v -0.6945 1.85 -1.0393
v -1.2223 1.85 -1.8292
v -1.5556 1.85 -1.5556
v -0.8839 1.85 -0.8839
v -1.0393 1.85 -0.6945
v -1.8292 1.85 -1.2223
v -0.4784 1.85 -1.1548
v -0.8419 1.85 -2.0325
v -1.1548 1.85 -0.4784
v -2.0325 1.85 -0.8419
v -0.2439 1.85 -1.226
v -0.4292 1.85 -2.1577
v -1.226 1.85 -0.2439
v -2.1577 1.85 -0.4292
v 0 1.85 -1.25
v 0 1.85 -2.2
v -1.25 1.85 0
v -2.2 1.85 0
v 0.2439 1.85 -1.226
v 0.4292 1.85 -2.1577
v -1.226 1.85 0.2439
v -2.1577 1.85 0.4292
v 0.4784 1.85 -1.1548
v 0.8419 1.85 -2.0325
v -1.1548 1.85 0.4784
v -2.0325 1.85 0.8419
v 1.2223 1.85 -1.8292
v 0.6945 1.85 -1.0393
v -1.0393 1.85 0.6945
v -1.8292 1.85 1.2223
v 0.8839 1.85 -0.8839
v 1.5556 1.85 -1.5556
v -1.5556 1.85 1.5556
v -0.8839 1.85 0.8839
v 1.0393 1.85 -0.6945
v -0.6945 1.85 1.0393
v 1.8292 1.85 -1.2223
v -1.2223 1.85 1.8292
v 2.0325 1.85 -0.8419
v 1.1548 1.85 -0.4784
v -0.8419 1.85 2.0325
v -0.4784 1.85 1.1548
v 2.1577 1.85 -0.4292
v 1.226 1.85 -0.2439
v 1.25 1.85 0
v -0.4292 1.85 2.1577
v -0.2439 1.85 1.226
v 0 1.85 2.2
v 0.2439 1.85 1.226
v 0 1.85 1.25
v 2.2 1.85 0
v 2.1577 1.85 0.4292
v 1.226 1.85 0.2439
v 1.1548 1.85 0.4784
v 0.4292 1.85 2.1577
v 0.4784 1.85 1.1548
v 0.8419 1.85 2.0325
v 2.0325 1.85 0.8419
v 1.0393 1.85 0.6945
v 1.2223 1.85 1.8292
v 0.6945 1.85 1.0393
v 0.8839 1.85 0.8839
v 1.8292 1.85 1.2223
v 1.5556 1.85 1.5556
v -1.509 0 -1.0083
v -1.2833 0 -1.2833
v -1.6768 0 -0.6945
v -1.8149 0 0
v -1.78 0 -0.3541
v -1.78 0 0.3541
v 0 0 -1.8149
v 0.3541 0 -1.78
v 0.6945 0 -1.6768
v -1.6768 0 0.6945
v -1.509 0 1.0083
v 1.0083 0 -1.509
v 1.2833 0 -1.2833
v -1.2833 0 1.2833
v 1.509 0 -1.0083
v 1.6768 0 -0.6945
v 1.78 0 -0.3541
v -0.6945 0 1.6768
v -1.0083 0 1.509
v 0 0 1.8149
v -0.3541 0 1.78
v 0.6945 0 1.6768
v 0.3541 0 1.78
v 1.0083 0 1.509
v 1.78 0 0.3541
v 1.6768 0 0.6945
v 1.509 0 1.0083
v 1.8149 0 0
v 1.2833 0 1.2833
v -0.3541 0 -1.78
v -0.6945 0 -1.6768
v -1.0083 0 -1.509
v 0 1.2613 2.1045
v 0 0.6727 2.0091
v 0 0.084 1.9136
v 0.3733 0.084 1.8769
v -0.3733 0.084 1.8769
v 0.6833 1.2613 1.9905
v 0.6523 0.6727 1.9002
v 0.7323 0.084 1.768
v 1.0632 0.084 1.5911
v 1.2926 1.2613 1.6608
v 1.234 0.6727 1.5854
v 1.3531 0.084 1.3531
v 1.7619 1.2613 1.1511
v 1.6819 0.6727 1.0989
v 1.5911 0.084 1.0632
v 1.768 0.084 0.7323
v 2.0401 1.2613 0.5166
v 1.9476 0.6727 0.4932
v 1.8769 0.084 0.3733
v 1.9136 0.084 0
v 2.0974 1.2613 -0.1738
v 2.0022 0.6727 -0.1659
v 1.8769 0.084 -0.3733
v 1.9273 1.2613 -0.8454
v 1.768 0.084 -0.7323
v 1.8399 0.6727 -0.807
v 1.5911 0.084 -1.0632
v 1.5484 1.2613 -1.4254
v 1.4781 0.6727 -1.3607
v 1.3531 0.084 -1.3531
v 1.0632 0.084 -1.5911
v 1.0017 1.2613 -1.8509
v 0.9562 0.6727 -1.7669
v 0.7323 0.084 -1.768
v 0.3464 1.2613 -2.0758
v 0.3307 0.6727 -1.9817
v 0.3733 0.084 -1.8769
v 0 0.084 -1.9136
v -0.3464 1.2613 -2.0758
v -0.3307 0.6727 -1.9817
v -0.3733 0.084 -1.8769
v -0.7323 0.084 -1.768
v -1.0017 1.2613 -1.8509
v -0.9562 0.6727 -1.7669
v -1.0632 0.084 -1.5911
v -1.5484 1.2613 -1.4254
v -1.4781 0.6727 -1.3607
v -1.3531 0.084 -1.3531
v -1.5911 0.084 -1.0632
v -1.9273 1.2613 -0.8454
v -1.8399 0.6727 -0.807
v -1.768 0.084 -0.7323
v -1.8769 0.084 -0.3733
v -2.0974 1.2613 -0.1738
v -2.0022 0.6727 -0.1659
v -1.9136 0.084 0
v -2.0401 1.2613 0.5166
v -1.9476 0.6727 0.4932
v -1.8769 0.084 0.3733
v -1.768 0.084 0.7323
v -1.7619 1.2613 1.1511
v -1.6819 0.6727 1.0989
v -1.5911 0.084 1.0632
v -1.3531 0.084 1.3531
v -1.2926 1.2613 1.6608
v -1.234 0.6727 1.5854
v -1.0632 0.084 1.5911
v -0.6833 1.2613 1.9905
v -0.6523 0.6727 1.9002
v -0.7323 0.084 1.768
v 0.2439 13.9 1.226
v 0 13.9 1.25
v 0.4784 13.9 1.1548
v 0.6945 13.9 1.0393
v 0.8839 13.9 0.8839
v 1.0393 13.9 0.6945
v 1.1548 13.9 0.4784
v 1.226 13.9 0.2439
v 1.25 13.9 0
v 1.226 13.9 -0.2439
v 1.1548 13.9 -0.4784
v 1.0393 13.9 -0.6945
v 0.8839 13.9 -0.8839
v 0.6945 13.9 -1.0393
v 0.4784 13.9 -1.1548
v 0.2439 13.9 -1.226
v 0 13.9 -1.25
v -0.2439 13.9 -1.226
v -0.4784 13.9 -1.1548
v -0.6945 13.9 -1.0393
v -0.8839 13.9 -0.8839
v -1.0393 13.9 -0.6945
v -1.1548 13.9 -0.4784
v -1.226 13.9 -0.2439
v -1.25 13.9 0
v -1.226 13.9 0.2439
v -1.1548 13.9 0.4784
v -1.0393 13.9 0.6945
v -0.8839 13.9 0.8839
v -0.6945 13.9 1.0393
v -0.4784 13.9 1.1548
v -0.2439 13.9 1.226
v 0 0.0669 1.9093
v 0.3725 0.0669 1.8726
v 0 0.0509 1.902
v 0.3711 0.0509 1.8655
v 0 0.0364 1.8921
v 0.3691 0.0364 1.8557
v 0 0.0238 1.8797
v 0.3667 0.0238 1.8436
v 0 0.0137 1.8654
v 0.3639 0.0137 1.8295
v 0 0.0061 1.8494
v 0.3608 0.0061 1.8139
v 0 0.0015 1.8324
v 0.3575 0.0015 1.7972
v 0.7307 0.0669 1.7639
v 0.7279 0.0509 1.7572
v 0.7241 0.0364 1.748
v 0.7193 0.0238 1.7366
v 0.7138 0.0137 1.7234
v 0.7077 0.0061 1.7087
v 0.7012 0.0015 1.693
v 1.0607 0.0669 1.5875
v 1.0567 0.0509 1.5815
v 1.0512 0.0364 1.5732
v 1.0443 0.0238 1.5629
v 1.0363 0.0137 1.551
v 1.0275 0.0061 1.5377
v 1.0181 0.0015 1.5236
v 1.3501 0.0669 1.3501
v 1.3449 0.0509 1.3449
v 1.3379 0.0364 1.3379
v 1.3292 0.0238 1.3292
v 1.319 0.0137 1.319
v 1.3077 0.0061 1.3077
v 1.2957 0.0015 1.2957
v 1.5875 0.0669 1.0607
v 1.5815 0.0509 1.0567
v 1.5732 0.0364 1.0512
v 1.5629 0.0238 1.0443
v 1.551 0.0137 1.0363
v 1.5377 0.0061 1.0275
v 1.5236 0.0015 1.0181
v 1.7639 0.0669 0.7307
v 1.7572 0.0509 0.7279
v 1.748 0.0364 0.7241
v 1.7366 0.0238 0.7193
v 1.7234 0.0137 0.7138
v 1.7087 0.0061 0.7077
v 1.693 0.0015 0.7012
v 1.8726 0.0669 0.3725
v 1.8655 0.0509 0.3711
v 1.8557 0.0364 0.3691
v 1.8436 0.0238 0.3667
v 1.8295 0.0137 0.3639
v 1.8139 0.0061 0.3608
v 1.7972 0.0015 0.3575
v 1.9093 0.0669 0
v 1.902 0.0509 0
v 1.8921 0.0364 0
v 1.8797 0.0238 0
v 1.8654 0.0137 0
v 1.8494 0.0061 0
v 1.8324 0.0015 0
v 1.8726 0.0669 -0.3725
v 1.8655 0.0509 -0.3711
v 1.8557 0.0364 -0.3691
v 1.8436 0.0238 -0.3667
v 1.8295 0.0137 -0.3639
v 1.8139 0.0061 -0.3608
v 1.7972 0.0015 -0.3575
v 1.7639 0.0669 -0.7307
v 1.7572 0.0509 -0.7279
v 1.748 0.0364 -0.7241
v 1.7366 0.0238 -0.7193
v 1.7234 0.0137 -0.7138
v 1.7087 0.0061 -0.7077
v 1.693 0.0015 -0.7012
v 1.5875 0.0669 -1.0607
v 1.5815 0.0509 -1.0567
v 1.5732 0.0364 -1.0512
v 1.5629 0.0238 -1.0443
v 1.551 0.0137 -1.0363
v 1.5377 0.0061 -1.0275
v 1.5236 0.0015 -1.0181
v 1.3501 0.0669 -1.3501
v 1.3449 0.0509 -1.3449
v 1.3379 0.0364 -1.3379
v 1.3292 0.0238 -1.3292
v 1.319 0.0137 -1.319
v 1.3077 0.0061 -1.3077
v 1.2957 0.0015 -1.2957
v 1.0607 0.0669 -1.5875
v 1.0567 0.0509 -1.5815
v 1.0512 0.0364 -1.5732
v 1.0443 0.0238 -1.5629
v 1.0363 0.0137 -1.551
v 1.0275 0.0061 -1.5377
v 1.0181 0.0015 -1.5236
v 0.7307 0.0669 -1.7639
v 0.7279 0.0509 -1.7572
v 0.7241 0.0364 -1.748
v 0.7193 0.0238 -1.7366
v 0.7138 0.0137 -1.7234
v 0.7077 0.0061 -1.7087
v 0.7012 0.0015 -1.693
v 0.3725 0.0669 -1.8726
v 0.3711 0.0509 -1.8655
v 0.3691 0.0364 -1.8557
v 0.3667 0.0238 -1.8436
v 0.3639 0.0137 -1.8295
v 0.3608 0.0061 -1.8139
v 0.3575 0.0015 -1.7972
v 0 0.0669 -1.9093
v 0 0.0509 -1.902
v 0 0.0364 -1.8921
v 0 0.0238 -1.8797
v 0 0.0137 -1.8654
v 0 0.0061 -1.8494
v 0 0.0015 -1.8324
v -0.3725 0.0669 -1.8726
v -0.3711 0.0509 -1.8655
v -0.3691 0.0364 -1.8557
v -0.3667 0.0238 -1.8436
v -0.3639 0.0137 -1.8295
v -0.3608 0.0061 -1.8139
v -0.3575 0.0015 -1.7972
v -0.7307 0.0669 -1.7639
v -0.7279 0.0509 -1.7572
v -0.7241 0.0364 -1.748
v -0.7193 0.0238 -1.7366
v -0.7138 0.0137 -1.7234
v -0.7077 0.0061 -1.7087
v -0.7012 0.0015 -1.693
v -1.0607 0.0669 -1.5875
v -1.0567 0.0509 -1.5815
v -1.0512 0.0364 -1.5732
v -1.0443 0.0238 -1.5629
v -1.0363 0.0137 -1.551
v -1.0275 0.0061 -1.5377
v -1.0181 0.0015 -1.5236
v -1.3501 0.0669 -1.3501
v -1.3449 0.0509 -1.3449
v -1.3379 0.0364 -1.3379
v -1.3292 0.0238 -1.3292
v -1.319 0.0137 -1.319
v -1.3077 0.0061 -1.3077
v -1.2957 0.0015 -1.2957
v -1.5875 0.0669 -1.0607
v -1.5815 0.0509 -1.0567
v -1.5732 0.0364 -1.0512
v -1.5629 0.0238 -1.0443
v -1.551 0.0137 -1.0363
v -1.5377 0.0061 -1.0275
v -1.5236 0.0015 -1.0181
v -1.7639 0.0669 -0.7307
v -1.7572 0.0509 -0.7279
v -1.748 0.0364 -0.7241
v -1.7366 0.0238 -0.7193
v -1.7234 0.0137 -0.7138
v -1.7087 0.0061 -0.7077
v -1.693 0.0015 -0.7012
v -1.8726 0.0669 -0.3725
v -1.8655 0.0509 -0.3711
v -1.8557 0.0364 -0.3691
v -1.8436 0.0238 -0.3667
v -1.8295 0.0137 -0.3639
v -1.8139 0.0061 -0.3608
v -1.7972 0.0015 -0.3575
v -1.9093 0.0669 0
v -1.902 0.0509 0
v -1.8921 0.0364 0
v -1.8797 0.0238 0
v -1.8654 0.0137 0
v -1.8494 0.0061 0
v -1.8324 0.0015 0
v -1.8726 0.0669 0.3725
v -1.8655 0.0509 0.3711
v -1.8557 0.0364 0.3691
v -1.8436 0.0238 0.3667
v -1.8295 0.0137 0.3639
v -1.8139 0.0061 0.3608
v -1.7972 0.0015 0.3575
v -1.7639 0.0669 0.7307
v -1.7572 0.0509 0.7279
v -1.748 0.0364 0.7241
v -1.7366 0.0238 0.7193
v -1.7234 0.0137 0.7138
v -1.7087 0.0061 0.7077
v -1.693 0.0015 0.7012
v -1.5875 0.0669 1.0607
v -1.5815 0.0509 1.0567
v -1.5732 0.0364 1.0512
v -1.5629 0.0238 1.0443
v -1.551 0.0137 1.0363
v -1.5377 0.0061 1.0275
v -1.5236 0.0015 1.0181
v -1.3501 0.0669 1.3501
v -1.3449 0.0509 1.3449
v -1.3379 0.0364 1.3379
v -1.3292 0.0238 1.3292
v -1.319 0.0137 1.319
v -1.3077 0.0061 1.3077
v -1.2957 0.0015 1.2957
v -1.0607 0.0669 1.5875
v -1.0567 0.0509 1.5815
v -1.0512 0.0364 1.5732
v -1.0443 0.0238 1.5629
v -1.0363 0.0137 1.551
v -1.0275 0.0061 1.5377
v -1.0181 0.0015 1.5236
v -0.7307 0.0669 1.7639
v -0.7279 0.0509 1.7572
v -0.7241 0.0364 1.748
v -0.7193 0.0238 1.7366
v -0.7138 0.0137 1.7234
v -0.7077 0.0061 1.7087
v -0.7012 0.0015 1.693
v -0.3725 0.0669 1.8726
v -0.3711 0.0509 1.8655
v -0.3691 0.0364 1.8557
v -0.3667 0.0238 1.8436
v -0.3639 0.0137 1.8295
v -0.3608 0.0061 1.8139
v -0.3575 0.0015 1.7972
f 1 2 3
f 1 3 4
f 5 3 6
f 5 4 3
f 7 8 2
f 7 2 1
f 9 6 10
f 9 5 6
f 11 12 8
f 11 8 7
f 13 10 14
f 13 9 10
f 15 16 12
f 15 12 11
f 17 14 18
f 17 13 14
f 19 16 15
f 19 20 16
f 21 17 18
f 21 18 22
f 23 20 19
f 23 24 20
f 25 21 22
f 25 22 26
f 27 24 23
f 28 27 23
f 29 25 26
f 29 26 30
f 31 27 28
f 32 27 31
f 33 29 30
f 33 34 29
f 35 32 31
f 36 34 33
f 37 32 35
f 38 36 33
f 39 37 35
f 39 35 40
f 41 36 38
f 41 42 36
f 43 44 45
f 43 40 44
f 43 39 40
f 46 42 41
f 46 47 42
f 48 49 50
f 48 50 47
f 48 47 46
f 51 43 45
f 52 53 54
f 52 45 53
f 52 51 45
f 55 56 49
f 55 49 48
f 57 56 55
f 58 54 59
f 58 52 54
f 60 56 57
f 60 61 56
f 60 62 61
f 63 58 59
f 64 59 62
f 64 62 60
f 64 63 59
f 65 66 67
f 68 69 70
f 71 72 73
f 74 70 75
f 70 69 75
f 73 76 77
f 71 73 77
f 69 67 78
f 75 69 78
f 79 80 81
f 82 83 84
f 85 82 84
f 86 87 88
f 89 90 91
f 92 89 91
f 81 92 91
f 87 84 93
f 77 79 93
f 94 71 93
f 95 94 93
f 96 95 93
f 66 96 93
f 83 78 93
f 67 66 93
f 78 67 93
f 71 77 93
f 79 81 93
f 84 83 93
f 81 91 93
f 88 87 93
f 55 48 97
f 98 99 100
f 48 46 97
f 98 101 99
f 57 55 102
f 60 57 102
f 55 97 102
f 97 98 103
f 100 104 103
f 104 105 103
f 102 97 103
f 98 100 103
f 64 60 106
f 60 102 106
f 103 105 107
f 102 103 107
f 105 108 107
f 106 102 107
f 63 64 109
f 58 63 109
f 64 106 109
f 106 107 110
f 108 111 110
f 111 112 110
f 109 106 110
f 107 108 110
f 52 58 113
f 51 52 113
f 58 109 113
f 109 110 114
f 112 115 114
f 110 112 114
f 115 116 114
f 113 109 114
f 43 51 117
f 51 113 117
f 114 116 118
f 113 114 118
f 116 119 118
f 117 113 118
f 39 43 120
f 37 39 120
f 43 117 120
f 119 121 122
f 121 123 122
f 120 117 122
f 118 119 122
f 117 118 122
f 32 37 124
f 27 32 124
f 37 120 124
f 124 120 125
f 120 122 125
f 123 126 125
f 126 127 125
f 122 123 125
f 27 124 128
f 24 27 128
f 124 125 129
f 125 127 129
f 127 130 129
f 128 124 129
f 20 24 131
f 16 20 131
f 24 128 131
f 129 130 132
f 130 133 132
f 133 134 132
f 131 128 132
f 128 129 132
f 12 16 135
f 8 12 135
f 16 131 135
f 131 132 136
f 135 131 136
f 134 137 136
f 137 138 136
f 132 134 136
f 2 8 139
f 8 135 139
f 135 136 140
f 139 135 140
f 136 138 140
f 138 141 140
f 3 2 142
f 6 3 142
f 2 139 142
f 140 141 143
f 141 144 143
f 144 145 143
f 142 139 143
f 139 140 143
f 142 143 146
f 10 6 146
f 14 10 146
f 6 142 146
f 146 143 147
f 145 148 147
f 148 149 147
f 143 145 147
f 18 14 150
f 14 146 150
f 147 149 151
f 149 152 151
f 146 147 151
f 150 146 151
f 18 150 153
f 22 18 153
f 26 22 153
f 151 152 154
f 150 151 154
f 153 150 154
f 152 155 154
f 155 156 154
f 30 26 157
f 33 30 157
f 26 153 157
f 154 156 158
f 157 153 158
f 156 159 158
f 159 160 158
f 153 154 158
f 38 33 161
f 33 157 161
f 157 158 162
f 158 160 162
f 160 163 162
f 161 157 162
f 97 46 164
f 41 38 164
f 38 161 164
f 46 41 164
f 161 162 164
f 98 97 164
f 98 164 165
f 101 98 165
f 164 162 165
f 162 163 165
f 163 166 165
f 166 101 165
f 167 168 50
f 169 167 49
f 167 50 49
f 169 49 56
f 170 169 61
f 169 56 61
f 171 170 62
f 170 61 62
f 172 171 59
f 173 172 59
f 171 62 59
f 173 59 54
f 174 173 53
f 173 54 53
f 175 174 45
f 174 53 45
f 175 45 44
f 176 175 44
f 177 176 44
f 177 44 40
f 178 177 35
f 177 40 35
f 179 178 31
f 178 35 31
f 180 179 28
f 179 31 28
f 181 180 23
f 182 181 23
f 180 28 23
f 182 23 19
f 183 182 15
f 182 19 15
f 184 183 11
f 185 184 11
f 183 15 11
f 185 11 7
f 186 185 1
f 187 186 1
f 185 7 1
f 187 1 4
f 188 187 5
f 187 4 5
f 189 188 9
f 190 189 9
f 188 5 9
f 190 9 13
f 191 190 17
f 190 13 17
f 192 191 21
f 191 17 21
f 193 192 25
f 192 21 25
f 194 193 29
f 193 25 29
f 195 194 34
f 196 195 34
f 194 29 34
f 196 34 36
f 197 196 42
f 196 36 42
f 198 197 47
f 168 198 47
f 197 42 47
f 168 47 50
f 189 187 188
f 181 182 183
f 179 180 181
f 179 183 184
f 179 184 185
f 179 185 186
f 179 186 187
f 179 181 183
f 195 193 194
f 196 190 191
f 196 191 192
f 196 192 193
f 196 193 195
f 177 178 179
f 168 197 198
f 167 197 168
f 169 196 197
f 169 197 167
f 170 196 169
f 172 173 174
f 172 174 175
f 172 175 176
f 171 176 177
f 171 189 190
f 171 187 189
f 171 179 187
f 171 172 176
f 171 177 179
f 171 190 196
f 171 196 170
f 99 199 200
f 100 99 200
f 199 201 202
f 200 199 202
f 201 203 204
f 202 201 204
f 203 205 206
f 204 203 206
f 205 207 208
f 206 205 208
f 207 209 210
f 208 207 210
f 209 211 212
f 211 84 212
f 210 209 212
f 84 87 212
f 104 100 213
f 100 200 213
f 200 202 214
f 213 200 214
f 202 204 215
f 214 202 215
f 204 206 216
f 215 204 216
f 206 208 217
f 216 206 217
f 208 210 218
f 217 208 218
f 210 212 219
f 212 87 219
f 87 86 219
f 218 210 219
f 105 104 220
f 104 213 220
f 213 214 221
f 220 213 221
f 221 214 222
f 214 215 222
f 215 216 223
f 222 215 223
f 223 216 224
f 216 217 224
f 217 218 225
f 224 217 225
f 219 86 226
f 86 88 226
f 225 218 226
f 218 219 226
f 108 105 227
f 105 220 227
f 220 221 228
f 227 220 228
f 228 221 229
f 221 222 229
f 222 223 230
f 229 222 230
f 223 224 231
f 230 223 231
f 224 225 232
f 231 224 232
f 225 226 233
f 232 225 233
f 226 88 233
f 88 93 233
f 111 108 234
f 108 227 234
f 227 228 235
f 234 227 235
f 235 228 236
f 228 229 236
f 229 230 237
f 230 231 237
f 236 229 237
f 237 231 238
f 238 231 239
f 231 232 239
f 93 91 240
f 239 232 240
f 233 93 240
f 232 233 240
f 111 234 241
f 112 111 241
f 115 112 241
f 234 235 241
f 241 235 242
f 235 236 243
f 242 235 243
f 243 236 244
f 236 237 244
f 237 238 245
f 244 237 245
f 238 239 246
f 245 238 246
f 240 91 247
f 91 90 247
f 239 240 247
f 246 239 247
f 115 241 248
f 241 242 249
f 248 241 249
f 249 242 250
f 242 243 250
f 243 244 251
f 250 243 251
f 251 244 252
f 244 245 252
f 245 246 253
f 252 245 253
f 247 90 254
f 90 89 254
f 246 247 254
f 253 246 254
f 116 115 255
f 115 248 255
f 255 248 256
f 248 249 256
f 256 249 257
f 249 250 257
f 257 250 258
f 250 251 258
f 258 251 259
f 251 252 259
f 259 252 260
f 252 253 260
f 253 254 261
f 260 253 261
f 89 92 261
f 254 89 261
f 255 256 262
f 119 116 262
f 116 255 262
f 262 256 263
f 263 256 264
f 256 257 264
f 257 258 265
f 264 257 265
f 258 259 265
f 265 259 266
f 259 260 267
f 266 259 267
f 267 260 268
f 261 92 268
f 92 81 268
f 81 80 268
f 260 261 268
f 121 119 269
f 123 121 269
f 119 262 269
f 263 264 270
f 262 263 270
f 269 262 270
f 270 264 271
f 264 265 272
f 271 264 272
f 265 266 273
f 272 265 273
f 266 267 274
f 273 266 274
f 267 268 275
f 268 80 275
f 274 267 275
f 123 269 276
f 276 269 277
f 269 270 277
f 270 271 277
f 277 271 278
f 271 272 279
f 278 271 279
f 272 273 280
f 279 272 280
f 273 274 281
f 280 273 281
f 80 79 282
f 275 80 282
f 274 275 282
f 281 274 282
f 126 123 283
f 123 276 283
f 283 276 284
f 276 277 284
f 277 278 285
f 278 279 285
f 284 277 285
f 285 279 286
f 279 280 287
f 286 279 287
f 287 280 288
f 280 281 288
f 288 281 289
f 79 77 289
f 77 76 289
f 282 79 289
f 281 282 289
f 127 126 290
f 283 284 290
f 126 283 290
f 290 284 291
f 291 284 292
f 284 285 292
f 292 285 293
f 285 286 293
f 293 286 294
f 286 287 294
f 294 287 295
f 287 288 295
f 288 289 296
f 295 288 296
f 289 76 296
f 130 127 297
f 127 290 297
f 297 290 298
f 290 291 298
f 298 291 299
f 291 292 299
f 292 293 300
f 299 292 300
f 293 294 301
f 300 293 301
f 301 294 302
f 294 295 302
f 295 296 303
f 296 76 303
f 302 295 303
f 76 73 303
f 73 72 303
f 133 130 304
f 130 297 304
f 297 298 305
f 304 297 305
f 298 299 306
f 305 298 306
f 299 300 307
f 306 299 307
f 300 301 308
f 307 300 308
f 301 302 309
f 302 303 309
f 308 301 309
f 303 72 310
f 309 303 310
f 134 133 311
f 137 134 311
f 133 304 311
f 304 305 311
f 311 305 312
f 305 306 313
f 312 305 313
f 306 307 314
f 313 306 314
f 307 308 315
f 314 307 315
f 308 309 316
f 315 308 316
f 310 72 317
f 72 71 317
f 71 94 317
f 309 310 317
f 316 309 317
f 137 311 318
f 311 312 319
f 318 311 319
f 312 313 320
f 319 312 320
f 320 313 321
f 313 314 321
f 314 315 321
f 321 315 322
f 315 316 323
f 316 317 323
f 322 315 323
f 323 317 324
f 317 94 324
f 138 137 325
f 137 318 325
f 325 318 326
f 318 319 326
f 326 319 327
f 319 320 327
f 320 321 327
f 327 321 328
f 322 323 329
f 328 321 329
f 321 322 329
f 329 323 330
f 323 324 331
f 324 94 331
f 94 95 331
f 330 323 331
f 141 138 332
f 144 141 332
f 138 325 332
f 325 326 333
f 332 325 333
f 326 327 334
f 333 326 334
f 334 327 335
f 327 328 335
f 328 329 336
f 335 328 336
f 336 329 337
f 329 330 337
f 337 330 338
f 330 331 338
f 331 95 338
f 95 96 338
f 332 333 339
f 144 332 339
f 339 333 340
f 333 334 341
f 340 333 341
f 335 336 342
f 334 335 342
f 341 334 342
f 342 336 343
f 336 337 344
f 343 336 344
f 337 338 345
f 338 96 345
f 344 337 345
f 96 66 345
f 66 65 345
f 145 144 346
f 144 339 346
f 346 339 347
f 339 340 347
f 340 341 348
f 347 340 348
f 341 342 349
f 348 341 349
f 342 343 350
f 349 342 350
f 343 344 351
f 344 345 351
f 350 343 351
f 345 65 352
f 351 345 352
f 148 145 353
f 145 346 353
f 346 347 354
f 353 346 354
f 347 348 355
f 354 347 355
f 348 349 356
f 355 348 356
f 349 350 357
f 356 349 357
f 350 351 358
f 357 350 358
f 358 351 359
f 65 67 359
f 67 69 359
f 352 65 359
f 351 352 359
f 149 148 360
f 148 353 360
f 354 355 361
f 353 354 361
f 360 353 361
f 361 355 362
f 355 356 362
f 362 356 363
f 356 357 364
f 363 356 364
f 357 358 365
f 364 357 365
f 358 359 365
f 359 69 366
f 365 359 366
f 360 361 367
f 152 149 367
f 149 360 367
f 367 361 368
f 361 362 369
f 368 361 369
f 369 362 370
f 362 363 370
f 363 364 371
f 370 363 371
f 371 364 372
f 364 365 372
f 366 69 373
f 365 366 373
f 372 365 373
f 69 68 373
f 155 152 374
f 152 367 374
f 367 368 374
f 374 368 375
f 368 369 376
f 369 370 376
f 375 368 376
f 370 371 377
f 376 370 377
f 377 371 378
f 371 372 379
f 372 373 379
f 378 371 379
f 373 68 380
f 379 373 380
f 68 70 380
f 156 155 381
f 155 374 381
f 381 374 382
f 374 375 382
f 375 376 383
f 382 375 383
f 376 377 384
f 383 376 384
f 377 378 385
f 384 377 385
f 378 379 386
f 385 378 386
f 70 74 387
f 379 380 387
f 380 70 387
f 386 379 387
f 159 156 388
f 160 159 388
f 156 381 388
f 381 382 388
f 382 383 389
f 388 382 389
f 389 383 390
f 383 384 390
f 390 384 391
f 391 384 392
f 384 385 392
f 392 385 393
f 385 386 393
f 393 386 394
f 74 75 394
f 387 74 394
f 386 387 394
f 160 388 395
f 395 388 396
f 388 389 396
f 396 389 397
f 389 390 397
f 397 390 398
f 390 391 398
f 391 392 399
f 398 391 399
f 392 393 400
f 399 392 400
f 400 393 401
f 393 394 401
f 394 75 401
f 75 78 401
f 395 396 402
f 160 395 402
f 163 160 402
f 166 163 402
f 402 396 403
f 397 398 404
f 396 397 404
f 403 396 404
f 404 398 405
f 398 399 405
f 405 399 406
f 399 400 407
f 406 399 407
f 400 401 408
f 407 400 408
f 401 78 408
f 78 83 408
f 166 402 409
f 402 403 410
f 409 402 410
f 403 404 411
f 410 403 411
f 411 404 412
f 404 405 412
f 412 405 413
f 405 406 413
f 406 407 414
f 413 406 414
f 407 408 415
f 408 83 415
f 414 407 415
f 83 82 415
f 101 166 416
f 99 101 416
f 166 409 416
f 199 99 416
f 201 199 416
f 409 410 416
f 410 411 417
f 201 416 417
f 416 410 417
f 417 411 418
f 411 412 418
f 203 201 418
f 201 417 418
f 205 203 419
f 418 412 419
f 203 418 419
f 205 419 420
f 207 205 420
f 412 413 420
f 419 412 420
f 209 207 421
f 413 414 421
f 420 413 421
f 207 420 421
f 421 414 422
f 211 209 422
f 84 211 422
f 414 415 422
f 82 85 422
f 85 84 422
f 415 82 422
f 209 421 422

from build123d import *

# Parameters (mm, degrees)
ESQUISSE1_R        = 2.2
BOSS_EXTRU_1_DEPTH = 1.85
ESQUISSE2_R        = 1.25
BOSS_EXTRU_2_DEPTH = 12.05
CHANFREIN1_SIZE    = 1.85
CHANFREIN1_SIZE_2  = 0.3
CONG_1_R           = 0.1


with BuildPart() as part:
    # Esquisse1 → Boss.-Extru.1 (new body)
    with BuildSketch(Plane(origin=(0, 0, 0), x_dir=(1, 0, 0), z_dir=(0, 1, 0))):
        with Locations(Location((0, 0, 0), (0, 0, 270))):
            Circle(ESQUISSE1_R)
    extrude(amount=BOSS_EXTRU_1_DEPTH)

    # Esquisse2 → Boss.-Extru.2 (add)
    with BuildSketch(Plane(origin=(0, 1.85, 0), x_dir=(1, 0, 0), z_dir=(0, 1, 0))):
        with Locations(Location((0, 0, 0), (0, 0, 270))):
            Circle(ESQUISSE2_R)
    extrude(amount=BOSS_EXTRU_2_DEPTH)

    # Chanfrein1
    # the kernel refuses this chamfer: 1.85, 0.3 mm, written as the material it takes off along each edge
    with BuildSketch(Plane(origin=(0, 0, 0), x_dir=(0, 0, 1), z_dir=(-1, 0, 0))) as chanfrein1_piece_1:
        Polygon((2.2, CHANFREIN1_SIZE), (2.2 - CHANFREIN1_SIZE_2, 0), (2.2, 0), align=None)
    revolve(axis=Axis((0, 0, 0), (0, 1, 0)), mode=Mode.SUBTRACT)

    # Congé1
    cong_1_edges = [part.edges().sort_by_distance(p)[0] for p in [
        (0, 0, -1.9),
    ]]
    fillet(cong_1_edges, radius=CONG_1_R)


solid = part.part
